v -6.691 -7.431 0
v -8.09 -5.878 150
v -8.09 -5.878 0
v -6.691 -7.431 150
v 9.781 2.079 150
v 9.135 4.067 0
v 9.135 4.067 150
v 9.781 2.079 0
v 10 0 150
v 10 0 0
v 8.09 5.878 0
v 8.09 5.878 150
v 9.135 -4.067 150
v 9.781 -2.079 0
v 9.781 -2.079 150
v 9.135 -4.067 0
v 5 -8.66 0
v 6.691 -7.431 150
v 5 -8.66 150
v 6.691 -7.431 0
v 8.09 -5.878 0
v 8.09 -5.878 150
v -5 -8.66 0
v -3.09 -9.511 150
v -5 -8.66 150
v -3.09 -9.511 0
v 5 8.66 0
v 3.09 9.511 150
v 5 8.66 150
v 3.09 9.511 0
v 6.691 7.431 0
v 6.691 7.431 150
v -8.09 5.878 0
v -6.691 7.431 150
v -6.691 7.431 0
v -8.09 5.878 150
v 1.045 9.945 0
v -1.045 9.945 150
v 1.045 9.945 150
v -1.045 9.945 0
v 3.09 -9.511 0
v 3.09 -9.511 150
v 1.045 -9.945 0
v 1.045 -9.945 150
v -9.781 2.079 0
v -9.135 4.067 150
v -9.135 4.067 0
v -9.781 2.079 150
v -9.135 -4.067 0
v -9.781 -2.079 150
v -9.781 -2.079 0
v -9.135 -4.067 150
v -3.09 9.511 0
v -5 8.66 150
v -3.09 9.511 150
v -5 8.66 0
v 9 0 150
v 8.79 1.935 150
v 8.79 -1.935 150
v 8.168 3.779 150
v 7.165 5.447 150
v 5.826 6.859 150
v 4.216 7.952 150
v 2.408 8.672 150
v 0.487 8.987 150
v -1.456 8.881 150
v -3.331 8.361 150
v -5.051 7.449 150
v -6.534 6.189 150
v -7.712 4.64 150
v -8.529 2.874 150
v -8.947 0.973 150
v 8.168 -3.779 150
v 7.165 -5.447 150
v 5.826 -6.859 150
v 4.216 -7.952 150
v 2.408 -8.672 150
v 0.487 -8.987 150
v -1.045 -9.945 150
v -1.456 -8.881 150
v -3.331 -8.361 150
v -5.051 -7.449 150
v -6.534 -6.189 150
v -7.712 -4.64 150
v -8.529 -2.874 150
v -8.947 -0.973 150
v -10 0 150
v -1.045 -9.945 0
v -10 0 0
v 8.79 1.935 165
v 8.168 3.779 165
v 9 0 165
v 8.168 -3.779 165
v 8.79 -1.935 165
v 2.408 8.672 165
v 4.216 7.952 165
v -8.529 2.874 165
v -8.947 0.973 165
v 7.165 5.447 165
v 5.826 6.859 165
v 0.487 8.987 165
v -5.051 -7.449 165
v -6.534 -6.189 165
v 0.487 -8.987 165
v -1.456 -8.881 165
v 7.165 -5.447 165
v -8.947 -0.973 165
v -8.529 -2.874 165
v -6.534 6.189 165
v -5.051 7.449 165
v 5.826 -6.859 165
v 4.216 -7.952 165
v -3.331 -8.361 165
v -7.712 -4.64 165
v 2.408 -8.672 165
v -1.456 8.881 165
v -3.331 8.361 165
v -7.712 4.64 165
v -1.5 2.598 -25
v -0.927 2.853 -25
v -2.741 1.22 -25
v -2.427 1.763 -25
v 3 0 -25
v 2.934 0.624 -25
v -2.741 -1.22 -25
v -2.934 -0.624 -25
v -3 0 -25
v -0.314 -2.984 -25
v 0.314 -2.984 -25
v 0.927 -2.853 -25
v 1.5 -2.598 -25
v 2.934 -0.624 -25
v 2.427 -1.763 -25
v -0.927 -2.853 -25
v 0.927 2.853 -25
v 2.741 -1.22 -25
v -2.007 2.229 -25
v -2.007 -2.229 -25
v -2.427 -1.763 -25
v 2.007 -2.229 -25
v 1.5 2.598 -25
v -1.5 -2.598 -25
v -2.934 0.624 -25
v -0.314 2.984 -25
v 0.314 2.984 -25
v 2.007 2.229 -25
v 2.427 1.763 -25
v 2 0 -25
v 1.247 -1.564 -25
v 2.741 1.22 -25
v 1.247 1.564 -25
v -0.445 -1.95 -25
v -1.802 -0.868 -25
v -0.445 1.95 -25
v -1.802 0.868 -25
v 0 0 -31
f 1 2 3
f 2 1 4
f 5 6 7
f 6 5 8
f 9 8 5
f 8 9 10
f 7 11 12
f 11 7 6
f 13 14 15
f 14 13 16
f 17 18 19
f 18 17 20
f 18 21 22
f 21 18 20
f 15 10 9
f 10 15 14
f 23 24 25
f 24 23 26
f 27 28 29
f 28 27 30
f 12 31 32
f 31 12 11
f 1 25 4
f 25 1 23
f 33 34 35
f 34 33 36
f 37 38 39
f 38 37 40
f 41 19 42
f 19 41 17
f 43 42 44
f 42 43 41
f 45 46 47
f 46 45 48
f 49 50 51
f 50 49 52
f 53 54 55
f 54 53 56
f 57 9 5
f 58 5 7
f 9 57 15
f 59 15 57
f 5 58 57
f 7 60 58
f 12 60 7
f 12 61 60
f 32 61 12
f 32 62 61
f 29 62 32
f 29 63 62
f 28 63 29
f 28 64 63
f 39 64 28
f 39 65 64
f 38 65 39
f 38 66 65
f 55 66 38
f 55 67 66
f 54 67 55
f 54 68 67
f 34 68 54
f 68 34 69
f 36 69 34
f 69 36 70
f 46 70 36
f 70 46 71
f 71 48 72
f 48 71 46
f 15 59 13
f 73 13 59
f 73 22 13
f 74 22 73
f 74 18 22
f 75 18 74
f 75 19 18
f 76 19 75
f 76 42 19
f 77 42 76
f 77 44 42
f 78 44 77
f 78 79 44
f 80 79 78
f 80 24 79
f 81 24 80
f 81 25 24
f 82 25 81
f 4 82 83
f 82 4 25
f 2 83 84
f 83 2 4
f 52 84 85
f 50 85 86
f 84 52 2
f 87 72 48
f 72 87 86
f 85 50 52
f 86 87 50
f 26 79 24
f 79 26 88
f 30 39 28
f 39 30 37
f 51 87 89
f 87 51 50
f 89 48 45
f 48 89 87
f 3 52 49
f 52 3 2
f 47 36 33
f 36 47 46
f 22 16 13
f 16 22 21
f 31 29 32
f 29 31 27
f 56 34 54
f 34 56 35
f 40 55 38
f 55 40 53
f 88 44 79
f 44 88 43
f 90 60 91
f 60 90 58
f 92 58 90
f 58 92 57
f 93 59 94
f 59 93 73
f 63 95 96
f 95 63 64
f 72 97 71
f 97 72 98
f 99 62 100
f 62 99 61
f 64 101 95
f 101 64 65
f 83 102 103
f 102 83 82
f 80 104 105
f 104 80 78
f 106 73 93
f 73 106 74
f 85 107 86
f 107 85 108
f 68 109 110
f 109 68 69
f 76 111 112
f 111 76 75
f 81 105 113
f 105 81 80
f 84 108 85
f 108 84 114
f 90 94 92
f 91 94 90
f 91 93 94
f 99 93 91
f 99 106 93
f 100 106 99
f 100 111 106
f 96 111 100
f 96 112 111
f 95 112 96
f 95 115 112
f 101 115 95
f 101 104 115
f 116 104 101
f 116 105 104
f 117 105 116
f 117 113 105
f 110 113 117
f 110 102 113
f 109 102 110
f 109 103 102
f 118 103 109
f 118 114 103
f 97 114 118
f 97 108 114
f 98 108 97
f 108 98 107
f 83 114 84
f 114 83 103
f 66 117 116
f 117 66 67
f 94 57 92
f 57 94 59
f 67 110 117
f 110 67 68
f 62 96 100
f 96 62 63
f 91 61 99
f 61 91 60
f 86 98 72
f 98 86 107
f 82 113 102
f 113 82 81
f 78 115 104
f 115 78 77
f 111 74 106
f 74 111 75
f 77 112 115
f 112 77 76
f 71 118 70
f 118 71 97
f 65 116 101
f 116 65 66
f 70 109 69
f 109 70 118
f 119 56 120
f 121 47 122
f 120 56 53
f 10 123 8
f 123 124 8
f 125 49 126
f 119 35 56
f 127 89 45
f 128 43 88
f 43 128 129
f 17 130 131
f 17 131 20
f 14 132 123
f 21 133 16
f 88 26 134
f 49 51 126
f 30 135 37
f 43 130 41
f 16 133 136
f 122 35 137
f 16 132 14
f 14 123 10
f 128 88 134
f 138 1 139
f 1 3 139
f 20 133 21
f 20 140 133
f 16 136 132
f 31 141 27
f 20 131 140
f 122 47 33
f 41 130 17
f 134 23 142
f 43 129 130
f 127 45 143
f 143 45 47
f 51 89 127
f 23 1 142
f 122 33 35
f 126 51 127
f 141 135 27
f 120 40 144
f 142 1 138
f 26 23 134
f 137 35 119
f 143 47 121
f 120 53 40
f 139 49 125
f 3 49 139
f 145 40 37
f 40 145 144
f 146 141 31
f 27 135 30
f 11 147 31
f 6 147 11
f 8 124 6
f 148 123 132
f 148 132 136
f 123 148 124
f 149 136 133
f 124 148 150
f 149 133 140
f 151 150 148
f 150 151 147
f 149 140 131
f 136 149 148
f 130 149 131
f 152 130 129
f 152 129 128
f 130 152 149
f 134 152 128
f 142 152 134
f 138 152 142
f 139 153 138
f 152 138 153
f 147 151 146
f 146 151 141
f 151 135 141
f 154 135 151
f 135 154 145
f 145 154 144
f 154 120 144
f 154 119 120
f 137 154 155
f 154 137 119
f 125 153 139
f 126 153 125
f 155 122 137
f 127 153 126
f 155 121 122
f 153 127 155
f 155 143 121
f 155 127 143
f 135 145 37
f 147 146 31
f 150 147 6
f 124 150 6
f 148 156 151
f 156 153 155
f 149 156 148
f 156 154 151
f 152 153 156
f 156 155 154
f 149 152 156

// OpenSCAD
cylinder(150,10,10);
translate([0,0,150])cylinder(15,9,9);
translate([0,0,-25])cylinder(25,3,10);
translate([0,0,-31])cylinder(6,0,2);
